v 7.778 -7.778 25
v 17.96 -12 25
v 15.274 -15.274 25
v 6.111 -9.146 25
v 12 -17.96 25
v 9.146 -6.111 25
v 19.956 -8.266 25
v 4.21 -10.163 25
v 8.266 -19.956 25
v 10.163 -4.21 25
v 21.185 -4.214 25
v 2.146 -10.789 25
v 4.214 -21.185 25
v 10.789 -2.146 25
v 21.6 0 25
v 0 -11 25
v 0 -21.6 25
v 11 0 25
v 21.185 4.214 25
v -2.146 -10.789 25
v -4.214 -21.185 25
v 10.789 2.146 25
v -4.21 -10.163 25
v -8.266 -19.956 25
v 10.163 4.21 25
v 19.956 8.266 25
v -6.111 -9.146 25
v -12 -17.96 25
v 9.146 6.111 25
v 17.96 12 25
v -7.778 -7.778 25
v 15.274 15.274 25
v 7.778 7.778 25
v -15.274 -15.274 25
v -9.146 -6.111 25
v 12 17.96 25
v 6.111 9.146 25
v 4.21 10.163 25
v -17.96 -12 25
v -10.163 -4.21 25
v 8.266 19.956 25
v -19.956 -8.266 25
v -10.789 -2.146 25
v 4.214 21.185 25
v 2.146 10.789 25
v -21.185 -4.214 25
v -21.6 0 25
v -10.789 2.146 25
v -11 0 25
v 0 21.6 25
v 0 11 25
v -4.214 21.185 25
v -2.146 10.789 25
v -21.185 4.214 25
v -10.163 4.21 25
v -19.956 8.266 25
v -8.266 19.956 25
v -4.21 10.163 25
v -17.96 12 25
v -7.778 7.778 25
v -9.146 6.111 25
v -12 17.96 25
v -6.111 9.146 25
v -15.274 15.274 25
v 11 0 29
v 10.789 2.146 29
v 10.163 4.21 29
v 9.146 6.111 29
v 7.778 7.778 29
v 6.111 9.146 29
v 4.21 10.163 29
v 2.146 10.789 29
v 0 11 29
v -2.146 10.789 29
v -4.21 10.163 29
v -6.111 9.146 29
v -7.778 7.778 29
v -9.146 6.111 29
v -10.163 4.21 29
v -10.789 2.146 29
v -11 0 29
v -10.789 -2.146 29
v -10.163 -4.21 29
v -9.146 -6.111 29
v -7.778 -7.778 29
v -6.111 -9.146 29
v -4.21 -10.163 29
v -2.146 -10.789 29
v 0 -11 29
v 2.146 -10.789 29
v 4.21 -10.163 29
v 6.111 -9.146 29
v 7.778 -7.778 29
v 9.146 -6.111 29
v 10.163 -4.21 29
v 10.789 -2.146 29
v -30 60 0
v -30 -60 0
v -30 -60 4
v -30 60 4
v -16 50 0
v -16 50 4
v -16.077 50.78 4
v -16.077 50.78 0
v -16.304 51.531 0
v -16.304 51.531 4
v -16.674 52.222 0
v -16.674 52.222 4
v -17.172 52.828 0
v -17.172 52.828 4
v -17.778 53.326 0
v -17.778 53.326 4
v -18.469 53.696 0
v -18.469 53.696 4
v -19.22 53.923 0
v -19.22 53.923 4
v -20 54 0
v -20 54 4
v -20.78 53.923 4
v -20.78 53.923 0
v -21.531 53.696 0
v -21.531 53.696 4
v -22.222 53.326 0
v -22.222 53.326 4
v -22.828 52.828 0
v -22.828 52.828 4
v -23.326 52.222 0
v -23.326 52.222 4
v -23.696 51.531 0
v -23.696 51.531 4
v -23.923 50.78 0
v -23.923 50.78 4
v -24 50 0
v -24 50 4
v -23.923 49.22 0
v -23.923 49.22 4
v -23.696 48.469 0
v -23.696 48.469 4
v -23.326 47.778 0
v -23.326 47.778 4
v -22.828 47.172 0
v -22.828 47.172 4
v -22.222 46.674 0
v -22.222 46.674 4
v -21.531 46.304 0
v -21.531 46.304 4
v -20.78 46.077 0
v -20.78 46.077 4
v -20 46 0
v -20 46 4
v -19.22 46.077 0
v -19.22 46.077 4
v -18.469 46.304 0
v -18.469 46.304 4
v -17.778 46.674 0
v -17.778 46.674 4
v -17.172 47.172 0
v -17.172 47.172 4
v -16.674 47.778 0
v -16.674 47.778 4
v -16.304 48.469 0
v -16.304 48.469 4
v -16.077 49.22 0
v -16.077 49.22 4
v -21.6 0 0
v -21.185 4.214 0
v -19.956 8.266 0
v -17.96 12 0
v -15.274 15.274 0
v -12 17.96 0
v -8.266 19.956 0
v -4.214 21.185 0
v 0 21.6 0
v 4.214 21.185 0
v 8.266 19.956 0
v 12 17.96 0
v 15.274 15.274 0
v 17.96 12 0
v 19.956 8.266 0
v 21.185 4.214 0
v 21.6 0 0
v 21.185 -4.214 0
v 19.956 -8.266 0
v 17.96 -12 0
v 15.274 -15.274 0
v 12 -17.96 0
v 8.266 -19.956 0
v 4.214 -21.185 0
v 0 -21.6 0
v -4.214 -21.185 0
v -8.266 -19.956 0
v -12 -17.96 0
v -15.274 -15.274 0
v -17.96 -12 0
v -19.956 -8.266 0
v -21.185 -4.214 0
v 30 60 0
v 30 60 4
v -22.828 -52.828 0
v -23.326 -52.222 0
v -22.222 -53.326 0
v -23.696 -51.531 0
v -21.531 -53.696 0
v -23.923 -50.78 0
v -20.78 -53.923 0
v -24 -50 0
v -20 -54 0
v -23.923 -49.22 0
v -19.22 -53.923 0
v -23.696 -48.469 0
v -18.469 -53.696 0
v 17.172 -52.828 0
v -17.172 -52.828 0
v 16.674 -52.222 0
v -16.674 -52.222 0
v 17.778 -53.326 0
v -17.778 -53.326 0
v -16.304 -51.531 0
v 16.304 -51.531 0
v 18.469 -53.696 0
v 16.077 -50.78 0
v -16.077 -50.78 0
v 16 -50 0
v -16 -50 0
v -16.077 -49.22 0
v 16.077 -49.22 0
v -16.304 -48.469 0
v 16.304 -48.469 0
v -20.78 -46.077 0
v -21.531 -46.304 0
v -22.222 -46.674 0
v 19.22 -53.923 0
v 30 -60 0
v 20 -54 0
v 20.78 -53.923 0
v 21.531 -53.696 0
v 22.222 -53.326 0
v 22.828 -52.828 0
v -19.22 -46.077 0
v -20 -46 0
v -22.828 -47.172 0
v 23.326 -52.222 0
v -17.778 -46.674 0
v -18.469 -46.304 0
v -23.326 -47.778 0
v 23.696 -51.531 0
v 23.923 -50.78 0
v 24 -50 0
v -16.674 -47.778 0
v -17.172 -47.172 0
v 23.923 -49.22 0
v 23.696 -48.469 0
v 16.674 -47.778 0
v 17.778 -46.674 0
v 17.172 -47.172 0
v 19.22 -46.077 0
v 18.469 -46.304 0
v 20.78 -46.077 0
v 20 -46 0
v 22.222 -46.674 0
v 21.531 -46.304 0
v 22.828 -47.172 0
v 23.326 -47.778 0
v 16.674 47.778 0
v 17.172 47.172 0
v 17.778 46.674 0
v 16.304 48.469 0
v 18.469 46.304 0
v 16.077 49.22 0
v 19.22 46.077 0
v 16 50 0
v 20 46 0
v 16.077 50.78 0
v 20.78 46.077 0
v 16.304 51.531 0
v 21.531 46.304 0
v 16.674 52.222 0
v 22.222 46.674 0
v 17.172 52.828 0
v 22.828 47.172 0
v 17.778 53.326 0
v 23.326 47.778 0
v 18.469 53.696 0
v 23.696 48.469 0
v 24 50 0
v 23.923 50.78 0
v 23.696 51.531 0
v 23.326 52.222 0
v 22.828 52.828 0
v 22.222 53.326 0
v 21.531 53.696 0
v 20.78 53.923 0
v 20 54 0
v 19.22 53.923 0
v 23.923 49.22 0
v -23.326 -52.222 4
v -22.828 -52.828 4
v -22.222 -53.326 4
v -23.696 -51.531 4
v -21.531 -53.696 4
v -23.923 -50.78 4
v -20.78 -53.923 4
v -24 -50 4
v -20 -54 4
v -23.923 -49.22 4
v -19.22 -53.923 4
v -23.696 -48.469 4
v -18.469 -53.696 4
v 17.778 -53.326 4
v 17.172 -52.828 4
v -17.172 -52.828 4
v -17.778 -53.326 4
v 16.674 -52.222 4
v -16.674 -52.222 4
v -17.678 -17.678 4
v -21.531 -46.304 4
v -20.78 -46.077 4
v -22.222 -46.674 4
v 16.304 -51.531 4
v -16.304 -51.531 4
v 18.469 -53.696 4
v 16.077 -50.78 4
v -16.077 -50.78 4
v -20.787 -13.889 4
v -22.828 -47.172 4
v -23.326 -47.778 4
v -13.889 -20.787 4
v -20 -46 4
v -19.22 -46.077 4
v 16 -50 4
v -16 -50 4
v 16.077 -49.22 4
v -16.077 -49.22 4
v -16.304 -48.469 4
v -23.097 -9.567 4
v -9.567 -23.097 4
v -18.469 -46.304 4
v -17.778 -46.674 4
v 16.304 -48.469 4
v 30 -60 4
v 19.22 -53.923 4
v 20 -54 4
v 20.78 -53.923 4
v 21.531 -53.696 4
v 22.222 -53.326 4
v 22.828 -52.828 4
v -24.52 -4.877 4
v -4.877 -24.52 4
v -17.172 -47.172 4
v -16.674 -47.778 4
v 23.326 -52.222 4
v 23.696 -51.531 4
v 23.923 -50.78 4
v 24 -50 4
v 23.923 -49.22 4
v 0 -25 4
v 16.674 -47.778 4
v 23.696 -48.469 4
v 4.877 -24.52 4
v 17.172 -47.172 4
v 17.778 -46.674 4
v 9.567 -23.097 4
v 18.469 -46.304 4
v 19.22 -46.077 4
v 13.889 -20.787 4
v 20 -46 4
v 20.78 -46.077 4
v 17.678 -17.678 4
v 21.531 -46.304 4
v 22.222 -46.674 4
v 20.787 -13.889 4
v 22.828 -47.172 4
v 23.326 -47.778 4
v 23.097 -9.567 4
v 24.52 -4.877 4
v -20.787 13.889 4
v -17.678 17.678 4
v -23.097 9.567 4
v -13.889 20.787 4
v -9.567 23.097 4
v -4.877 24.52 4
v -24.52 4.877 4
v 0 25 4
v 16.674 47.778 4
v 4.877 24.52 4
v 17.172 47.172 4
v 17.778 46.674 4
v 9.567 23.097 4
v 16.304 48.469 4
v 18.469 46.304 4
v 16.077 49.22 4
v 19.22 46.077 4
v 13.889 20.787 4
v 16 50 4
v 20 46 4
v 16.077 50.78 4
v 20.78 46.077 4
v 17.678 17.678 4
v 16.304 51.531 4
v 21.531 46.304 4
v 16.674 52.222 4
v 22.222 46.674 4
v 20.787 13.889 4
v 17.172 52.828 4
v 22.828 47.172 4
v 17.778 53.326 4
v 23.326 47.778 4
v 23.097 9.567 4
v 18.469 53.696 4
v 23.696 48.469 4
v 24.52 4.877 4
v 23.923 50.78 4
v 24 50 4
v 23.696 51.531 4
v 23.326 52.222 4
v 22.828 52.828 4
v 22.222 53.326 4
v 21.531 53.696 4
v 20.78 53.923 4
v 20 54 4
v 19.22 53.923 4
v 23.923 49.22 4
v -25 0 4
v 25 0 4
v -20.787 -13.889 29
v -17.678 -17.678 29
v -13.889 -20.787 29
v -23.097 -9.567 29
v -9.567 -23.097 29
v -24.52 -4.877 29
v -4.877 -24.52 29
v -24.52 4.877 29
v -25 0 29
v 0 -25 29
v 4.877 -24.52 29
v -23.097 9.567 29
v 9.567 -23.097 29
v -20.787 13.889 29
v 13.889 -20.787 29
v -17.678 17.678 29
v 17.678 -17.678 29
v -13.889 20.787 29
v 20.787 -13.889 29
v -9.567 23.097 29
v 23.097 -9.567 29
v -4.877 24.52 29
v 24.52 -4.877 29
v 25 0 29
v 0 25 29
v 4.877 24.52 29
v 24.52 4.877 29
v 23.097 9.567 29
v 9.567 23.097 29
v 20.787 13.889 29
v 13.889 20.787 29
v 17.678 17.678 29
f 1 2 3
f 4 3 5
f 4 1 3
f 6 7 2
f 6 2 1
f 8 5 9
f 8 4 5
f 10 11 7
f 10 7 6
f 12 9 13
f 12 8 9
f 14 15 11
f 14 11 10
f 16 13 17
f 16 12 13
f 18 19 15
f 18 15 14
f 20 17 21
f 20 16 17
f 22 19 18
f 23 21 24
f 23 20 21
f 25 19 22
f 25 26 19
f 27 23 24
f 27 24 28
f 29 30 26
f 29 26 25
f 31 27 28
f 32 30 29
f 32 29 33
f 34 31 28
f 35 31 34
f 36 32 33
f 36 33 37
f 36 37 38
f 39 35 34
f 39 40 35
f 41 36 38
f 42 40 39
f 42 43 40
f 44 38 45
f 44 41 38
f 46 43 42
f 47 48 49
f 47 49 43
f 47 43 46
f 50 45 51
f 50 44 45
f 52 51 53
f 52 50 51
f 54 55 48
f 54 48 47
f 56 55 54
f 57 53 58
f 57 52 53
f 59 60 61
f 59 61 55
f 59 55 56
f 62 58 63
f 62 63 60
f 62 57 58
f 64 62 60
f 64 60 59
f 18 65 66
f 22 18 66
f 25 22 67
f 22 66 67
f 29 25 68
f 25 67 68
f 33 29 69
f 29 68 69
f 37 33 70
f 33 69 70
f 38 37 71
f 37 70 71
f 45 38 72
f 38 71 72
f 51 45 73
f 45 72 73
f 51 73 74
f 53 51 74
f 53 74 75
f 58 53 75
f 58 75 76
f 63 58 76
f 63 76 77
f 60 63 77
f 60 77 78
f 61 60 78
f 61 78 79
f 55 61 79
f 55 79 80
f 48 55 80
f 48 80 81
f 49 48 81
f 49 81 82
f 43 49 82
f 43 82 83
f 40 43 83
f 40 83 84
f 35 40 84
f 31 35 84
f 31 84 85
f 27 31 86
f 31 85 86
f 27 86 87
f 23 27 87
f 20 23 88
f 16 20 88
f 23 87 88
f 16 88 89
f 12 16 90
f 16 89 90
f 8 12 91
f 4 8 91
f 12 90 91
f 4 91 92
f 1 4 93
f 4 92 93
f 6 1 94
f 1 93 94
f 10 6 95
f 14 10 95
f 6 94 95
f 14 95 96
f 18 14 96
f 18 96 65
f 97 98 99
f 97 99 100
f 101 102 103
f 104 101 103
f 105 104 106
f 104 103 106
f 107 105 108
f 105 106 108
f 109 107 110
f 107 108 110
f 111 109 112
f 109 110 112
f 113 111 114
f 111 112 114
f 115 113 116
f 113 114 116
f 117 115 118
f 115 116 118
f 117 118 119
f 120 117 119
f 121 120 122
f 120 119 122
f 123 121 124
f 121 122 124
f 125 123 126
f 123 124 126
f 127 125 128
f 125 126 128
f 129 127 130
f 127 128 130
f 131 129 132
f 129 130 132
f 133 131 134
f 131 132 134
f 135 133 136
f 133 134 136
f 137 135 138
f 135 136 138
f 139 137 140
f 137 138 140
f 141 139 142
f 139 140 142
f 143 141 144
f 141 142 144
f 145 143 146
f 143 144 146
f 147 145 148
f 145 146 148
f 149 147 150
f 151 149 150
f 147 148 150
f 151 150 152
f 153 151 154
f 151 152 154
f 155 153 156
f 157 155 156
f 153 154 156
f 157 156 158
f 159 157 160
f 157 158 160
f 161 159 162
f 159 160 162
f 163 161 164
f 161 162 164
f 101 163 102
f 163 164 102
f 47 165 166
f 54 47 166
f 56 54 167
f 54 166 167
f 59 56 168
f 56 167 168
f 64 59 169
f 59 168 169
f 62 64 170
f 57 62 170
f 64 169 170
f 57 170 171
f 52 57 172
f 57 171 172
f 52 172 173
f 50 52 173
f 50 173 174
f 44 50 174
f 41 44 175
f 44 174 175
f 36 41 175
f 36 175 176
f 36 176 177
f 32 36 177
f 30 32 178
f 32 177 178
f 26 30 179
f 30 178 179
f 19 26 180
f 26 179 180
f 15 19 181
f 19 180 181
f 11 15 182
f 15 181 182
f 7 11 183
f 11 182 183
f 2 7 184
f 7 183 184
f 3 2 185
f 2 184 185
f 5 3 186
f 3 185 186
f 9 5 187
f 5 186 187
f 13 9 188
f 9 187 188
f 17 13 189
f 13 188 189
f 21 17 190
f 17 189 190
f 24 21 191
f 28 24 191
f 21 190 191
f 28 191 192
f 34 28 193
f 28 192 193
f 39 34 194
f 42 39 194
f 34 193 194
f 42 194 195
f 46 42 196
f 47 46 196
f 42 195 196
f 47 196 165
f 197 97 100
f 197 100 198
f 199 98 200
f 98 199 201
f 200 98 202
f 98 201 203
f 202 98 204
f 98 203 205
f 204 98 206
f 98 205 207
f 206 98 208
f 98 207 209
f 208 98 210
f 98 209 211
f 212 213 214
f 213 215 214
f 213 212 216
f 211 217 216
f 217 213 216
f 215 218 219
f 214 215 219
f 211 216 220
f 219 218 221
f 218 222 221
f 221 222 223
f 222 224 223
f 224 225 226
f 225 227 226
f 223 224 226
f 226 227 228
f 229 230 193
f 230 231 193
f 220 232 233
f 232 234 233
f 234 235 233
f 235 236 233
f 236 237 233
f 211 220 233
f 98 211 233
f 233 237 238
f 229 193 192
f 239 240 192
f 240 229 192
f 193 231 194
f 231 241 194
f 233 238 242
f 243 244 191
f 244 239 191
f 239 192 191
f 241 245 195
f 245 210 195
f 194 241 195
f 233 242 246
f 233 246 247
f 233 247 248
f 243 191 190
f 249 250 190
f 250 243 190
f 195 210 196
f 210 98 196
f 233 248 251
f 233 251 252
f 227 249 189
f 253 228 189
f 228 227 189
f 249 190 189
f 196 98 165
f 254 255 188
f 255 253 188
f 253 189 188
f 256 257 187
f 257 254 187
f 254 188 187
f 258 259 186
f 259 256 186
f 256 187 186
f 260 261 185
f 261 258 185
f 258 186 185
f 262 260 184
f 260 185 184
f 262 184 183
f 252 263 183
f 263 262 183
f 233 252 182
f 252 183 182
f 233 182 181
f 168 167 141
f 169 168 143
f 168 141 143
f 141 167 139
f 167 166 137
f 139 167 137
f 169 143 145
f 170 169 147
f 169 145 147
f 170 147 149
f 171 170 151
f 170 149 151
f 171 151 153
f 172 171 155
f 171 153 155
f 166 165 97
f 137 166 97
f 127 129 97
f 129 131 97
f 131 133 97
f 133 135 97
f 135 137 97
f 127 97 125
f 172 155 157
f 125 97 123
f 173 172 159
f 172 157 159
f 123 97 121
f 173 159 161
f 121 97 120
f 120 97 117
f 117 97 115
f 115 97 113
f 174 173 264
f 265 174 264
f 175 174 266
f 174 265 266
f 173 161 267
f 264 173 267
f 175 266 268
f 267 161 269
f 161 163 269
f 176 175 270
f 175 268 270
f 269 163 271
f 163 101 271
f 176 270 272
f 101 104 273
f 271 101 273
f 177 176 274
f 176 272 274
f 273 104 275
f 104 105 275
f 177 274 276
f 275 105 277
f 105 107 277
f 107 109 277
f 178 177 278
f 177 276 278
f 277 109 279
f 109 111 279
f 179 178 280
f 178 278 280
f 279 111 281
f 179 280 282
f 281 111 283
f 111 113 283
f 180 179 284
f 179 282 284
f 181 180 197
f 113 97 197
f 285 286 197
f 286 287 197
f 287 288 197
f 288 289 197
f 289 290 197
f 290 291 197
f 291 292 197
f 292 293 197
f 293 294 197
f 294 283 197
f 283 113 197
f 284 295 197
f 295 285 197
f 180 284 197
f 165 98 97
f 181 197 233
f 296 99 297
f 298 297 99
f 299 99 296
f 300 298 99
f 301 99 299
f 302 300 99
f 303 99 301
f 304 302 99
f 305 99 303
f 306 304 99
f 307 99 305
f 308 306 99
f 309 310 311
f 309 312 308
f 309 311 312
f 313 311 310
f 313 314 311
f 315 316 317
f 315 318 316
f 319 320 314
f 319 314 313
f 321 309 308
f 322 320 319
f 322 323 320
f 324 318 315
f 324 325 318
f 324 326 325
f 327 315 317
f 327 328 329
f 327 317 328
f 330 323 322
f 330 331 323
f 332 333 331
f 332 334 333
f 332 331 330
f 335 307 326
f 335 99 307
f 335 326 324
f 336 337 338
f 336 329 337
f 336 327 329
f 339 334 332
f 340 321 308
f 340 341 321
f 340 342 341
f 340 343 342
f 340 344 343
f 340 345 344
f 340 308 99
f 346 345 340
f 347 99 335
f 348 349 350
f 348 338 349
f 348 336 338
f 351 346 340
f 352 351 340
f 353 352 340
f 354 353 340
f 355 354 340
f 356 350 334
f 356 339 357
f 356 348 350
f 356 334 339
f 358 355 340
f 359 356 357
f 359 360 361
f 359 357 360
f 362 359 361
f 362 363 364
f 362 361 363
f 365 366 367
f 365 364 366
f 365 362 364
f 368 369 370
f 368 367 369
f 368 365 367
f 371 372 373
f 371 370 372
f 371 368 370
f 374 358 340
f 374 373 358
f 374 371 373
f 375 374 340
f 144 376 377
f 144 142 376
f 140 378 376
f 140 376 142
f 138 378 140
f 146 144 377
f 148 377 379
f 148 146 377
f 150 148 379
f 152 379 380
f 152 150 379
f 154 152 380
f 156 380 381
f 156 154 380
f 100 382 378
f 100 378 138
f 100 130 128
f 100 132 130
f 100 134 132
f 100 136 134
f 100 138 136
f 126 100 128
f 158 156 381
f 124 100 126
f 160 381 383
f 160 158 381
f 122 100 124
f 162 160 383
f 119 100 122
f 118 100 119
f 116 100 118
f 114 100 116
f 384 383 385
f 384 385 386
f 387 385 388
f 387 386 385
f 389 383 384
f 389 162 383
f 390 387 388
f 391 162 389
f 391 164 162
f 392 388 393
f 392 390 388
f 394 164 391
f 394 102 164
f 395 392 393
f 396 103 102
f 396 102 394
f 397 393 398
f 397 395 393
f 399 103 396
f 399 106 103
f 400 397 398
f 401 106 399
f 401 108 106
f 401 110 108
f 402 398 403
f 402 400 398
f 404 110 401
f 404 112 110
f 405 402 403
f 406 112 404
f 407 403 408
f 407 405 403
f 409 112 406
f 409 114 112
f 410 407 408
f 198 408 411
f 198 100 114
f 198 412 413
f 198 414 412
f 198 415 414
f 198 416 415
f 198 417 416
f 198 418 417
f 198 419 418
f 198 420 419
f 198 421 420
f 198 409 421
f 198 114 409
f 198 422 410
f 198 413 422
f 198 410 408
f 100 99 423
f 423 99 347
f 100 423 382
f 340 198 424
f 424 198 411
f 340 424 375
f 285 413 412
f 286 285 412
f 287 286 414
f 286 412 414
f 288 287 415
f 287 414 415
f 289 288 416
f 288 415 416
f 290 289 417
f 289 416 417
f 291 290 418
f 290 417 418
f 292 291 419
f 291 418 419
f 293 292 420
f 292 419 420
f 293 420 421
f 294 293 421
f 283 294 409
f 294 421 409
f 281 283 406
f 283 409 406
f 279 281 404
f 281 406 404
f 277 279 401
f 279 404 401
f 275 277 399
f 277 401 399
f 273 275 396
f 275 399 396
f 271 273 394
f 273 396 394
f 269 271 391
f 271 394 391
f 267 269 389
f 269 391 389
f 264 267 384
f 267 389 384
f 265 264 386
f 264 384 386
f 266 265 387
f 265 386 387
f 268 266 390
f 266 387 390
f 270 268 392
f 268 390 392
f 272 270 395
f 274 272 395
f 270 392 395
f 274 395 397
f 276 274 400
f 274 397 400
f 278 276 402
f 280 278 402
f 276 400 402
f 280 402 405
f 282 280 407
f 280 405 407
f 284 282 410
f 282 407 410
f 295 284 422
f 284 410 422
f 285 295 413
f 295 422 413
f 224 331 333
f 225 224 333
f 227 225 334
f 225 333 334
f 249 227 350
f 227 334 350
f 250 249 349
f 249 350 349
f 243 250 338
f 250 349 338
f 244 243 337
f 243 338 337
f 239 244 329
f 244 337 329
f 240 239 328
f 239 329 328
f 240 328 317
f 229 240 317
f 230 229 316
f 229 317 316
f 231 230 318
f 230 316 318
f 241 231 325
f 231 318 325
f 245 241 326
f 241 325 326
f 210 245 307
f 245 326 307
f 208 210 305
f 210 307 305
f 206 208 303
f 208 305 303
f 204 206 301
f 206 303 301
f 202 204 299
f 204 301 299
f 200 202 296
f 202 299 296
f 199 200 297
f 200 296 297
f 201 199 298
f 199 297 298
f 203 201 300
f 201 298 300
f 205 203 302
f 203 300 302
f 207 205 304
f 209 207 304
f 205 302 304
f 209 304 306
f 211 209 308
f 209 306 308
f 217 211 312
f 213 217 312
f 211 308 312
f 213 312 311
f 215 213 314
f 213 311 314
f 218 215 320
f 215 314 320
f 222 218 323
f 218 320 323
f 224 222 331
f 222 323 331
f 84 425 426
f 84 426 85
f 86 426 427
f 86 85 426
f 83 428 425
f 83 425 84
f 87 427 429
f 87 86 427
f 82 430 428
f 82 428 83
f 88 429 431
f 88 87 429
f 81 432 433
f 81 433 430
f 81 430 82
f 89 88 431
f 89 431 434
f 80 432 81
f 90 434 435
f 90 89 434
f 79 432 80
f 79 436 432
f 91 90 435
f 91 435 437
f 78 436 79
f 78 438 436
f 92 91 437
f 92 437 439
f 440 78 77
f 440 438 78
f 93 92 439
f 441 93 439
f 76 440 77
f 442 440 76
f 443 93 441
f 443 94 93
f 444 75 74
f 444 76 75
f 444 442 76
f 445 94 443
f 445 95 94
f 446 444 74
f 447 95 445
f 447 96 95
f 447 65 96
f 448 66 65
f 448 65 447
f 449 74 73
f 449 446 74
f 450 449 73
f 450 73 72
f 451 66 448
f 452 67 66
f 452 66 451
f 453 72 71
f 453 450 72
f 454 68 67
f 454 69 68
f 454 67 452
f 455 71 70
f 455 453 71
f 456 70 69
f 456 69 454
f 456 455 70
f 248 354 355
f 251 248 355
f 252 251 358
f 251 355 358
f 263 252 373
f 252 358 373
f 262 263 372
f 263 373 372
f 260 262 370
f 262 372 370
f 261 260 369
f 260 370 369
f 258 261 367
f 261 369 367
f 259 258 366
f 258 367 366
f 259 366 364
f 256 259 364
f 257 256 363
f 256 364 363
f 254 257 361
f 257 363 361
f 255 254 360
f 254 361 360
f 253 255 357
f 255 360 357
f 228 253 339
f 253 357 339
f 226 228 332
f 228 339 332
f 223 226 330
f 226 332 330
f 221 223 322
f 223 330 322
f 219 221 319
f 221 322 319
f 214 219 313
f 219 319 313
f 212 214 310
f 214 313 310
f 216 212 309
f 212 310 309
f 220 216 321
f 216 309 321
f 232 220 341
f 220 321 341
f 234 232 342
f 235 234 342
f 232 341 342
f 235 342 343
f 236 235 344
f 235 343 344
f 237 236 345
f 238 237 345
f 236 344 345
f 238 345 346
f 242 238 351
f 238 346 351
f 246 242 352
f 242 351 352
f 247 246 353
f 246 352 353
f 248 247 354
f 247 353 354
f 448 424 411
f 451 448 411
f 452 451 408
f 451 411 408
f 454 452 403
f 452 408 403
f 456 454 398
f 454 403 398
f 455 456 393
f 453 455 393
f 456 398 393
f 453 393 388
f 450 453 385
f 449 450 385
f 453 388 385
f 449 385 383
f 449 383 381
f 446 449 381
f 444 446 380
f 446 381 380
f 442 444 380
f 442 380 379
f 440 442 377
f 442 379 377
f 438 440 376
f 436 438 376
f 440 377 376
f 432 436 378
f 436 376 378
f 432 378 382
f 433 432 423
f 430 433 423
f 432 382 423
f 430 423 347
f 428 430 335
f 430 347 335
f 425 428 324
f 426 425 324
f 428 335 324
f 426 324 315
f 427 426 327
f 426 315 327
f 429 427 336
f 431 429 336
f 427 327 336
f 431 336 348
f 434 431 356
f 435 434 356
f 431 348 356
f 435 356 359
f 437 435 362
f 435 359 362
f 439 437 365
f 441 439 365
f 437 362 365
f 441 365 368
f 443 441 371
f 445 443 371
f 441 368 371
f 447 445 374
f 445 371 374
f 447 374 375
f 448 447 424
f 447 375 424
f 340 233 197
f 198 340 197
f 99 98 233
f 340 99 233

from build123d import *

# Parameters (mm, degrees)
SKETCH1_W           = 60
SKETCH1_H           = 120
BOSS_EXTRUDE1_DEPTH = 4
SKETCH2_R           = 4
CUT_EXTRUDE1_DEPTH  = 4
SKETCH3_R           = 25
BOSS_EXTRUDE2_DEPTH = 25
SKETCH4_R           = 21.6
CUT_EXTRUDE2_DEPTH  = 25
SKETCH5_R           = 11
CUT_EXTRUDE3_DEPTH  = 25


with BuildPart() as part:
    # Sketch1 → Boss-Extrude1 (new body)
    with BuildSketch(Plane.XY):
        Rectangle(SKETCH1_W, SKETCH1_H)
    extrude(amount=BOSS_EXTRUDE1_DEPTH)

    # Sketch2 → Cut-Extrude1 (cut)
    with BuildSketch(Plane.XY.offset(4)):
        with Locations((-20, 50)):
            Circle(SKETCH2_R)
        with Locations((20, 50)):
            Circle(SKETCH2_R)
        with Locations((20, -50)):
            Circle(SKETCH2_R)
        with Locations((-20, -50)):
            Circle(SKETCH2_R)
    extrude(amount=-CUT_EXTRUDE1_DEPTH, mode=Mode.SUBTRACT)

    # Sketch3 → Boss-Extrude2 (add)
    with BuildSketch(Plane.XY.offset(4)):
        Circle(SKETCH3_R)
    extrude(amount=BOSS_EXTRUDE2_DEPTH)

    # Sketch4 → Cut-Extrude2 (cut)
    with BuildSketch(Plane(origin=(0, 0, 0), x_dir=(-1, 0, 0), z_dir=(0, 0, -1))):
        Circle(SKETCH4_R)
    extrude(amount=-CUT_EXTRUDE2_DEPTH, mode=Mode.SUBTRACT)

    # Sketch5 → Cut-Extrude3 (cut)
    with BuildSketch(Plane.XY.offset(29)):
        Circle(SKETCH5_R)
    extrude(amount=-CUT_EXTRUDE3_DEPTH, mode=Mode.SUBTRACT)


solid = part.part
